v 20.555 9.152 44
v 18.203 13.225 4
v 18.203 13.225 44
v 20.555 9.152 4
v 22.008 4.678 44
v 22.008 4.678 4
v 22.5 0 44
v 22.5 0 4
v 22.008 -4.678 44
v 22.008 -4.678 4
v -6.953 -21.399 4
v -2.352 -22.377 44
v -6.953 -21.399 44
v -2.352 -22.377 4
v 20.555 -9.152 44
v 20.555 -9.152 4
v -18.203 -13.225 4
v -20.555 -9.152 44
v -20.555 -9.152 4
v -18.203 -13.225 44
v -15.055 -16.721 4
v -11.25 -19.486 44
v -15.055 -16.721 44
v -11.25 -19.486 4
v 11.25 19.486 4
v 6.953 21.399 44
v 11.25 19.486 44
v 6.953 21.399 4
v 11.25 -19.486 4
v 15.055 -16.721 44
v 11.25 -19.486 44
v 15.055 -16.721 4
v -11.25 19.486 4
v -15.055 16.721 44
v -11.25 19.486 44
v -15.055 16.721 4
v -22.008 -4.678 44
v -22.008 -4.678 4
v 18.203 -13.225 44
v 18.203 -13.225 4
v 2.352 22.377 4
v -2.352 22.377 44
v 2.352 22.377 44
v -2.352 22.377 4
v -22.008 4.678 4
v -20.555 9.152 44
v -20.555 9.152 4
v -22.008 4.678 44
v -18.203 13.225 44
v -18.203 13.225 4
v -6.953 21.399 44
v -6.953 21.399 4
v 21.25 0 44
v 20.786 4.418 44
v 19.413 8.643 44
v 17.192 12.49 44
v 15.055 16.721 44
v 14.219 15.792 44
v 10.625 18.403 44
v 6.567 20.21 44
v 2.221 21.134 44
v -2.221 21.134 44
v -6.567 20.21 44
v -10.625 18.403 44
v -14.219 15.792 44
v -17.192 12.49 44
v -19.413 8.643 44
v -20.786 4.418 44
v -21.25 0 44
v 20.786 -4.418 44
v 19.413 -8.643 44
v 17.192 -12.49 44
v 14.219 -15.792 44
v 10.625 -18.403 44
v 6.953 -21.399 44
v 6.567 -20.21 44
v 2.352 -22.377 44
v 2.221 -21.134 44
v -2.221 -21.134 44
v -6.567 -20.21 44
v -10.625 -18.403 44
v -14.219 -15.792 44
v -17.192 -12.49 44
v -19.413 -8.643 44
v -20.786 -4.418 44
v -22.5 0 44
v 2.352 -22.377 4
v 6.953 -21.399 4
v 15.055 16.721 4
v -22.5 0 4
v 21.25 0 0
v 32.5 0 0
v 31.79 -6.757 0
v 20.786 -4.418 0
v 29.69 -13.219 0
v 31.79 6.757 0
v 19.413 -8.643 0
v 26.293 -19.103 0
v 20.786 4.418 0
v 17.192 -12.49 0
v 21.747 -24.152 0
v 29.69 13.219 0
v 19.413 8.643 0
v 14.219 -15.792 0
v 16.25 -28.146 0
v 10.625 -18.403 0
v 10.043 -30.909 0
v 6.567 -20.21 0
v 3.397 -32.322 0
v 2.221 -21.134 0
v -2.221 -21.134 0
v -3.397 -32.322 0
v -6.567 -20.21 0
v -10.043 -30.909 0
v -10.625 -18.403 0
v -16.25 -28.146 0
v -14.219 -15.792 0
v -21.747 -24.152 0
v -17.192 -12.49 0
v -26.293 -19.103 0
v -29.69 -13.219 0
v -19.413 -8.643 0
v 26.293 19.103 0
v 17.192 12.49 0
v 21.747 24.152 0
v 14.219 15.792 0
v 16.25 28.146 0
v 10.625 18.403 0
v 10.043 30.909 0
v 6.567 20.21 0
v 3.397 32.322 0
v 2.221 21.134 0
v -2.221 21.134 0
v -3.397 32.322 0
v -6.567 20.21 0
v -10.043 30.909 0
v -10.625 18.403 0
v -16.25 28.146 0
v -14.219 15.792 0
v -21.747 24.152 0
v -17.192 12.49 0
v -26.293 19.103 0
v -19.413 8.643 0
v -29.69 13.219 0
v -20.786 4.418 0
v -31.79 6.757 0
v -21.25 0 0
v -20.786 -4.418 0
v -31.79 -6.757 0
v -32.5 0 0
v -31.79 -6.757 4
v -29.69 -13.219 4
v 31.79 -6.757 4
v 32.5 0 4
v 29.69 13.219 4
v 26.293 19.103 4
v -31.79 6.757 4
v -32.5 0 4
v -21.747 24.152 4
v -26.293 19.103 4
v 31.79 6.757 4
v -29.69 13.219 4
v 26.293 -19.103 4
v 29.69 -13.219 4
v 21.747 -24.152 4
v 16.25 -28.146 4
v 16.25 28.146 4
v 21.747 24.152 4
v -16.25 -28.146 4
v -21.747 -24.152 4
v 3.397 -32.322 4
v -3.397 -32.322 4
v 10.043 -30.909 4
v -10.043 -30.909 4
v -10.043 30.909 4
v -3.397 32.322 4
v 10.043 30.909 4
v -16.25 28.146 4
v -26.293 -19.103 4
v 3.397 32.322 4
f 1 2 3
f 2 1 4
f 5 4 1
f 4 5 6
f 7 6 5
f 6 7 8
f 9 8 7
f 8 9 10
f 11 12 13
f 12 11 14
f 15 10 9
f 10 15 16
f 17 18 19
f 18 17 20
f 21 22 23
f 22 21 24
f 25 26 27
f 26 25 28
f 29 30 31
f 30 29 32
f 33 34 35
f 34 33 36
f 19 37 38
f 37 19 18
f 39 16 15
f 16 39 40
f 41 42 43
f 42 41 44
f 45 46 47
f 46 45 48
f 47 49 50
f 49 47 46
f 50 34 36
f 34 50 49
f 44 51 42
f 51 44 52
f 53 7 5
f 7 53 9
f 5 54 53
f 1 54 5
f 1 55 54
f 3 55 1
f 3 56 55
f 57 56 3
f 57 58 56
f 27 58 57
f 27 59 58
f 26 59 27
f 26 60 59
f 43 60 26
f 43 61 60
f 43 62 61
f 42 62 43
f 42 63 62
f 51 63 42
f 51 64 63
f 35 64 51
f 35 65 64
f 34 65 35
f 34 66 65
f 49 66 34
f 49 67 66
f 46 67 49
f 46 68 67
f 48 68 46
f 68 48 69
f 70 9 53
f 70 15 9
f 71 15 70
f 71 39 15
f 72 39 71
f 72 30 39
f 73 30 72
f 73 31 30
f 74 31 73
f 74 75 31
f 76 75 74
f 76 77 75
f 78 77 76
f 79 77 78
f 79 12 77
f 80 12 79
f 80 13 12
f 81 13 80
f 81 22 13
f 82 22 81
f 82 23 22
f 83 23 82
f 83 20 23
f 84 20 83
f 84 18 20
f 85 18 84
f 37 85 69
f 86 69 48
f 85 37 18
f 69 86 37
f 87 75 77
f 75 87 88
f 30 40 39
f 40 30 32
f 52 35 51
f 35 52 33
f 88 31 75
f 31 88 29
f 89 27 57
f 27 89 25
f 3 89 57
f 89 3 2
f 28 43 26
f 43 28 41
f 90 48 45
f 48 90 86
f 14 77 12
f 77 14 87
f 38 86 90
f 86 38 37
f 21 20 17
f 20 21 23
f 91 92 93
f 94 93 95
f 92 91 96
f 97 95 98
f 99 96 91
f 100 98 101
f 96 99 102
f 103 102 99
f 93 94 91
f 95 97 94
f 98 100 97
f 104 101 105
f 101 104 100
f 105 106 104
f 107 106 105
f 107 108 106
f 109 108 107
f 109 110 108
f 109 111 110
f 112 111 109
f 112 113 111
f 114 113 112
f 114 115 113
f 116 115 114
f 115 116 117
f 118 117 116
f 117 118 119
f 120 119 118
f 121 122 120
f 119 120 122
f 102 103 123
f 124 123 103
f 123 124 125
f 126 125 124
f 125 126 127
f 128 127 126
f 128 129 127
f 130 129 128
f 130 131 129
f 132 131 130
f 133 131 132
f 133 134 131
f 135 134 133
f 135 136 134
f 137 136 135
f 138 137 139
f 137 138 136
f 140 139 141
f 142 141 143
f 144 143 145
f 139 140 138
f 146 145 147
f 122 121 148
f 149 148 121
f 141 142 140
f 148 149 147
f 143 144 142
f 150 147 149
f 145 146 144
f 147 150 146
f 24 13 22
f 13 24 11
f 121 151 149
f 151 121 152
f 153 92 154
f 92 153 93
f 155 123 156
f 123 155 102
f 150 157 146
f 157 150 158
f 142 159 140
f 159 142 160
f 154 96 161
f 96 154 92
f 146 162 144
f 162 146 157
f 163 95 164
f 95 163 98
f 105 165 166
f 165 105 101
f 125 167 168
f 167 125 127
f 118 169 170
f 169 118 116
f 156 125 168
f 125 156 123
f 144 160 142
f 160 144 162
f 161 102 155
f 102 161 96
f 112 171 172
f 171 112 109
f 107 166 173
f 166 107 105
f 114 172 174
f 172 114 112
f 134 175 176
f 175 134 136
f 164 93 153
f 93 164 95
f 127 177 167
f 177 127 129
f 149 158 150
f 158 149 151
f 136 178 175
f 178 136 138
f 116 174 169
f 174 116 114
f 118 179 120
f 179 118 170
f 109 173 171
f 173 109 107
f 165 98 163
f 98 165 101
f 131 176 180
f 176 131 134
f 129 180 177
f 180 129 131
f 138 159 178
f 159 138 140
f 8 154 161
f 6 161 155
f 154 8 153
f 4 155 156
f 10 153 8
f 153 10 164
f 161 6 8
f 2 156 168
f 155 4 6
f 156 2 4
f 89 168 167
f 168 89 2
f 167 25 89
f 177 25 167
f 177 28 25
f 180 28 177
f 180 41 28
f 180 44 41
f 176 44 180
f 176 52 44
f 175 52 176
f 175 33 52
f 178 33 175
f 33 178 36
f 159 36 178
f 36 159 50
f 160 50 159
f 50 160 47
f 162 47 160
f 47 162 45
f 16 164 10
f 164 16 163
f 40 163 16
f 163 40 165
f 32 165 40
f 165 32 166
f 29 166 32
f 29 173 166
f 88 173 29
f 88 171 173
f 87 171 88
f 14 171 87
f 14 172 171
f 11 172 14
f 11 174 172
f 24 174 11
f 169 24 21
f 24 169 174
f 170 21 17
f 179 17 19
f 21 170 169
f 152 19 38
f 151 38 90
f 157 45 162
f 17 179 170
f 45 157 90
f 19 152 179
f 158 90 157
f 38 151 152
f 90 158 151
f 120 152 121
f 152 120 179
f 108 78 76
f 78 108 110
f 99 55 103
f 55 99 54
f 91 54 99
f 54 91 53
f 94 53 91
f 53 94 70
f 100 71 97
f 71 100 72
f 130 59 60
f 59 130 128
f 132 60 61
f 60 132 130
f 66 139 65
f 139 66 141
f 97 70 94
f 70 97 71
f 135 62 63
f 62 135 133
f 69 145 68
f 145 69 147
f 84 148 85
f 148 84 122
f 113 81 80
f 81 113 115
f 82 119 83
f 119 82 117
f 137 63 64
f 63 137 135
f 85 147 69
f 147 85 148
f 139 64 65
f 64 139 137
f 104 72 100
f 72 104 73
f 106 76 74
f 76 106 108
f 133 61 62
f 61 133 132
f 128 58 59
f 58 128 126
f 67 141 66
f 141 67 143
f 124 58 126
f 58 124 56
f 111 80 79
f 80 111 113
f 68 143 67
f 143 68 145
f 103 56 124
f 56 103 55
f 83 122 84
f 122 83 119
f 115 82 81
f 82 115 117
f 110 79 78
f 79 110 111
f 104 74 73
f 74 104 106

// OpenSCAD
// file: parameters/verticalShaftHolderParameters.scad
// https://paper.dropbox.com/doc/Shaft-Holder-with-Bearings--BPUd0R93dqpLMge3XfPWzi2zAg-a79LjXcU3vrNJJHZMteSG

rollerBearingInsideDiameter = 45; // Same as Thrust Bearing bore diameter
rollerBearingHeight = 20;
rollerBearingOutsideDiameter = 52.2;

thrustBearingOutsideDiameter = 65;
thrustBearingHeight = 14;
thrustBearingOuterDiameterShaftWasher = 47;

thrustBearingMinimumAbutmentDiameter = 57; // This is a MINIMUM

comfortablePinningDiameter = 55; // Could maybe be bigger?
comfortablePinnedSectionHeight = 20; // May need testing
// file: parameters/commonParameters.scad
// All measurements in millimeters

// "horizontal" and "vertical" refer to how they are printed on the print bed,
// not how they work on the final assembly.
// ALWAYS print verticle pipes straight up if possible, that is 90 degrees from the bed.
// Attempting to print a slanted pipe will be troublesome and require testing for a proper size.
// However, you can print ANY angle ON the bed.

// 1.25" PVC Pipe:
horizontalPipeInsideDiameter_1_25pvc = 42.9;
verticalPipeInsideDiameter_1_25pvc = 42.5;

// 0.5" PVC Pipe:
horizontalPipeInsideDiameter_0_50pvc = 22.1;
verticalPipeInsideDiameter_0_50pvc = 21.7;

// Parameters
jointLegLength = 50;
jointWallThickness = 3.5;
jointPinningHoleDiameter = 7;
jointPinHoleOffset = 10;

// Walker Foot Parameters
inchesToMmConversionFactor = 25.4;

// Current idea is 11 x 21 inches.
walkerFootHeight = 11 * inchesToMmConversionFactor;
walkerFootLength = 21 * inchesToMmConversionFactor;
// Back of Foot is 4 inches longer to cause foot to hang AND LOOK as desired
// I tried 1 inch and it had basically NO affect on how it hangs.
// I think it looks cool at 4 inches, so I am going to test that.
// I *THINK* that it actually doesn't affect lenght of the walker, because the front
// of one compensates for the back of the other.
walkerFootCenterOffset = 0 * inchesToMmConversionFactor; // Remember to multiply any offset by the conversion factor.
walkerFootFrontLength = (walkerFootLength / 2) - (walkerFootCenterOffset / 2);
walkerFootBackLength = (walkerFootLength / 2) + (walkerFootCenterOffset / 2);

footLowerJointLegLength = 75;

// Angles
// This site is great for visualizing what you want: https://www.blocklayer.com/trig/scaleneeng.aspx
// Use this site to check your math and results: https://www.calculator.net/right-triangle-calculator.html
//echo("=======================================================");
//echo("Walker Foot Parameters");
//echo("walkerFootLength", walkerFootLength, walkerFootFrontLength + walkerFootBackLength);
//echo("=======================================================");
//echo("Front:");
//echo("walkerFootHeight (a)", walkerFootHeight);
//echo("walkerFootFrontLength (b)", walkerFootFrontLength);
//walkerFootFrontTriangleTopLength = sqrt(pow(walkerFootHeight, 2) + pow(walkerFootFrontLength, 2));
//echo("walkerFootFrontTriangleTopLength (c)", walkerFootFrontTriangleTopLength);
//walkerFootFrontJointAngle = asin(walkerFootHeight / walkerFootFrontTriangleTopLength);
//echo("walkerFootFrontJointAngle (α):", walkerFootFrontJointAngle);
//walkerAnkleFrontAngle = asin(walkerFootFrontLength / walkerFootFrontTriangleTopLength);
//echo("walkerAnkleFrontAngle (β)", walkerAnkleFrontAngle);
//echo("-------------------------------------------------------");
//echo("Back");
//echo("walkerFootBackLength (b)", walkerFootBackLength);
//walkerFootBackTriangleTopLength = sqrt(pow(walkerFootHeight, 2) + pow(walkerFootBackLength, 2));
//echo("walkerFootBackTriangleTopLength (c)", walkerFootBackTriangleTopLength);
//walkerFootBackJointAngle = asin(walkerFootHeight / walkerFootBackTriangleTopLength);
//echo("walkerFootBackJointAngle (α):", walkerFootBackJointAngle);
//walkerAnkleBackAngle = asin(walkerFootBackLength / walkerFootBackTriangleTopLength);
//echo("walkerAnkleBackAngle (β)", walkerAnkleBackAngle);
//echo("=======================================================");



// This height is purely based on giving space for nice triangles supports.
// It could be shorter, just be sure to adjust the triangles.
walkerBodyLowerShaftHolderRollerBearingHeightAboveThrustBearing = 50;

// 12v Battery Box
batteryHolderWallThickness = 5;

// Battery Dimensions
// https://www.power-sonic.com/product/ps-1290/
batteryHeight = 94;
batteryWidth = 65.6; // Ben uses 65.6, Web Site says 65
batteryLength = 150.6; // Ben uses 150.6, Web site says 141
batteryBoxDepth = 60; // This is arbitrary. Ben uses 60 for the Dalek

// Colors
JointColor = "CornflowerBlue";
PipeColor = "Pink";

// Resoution
// This is perfect for 3D Printing,
// but you may want to comment it out while working to improve preview
// performance
//$fa = 1;
//$fs = 0.4;
// Although this makes it VERY high rez, which might be better for the slicer? Experimenting with it instead.
// NOTE that using $fn causes FreeCAD and hence .step files exported to Fusion 360 to show round items as a series of faces instead of a single object.
//$fn = 500;
// file: verticalShaftHolder.scad
include <parameters/commonParameters.scad>;
include <parameters/verticalShaftHolderParameters.scad>;

// This piece should be able to slide onto the shaft,
// be pinned in place,
// Have a Thrust Bearing sit on it,
// and then have a part that moves around the shaft sit on it.

module verticalShaftHolder(includePinnedRing = true, thrustBearingSupportHeight = thrustBearingHeight,
rollerBearingHeightAboveThrustBearing = thrustBearingHeight, roundedThrustBearingSupport = true, thrustBearingHeightOverride = thrustBearingHeight) {

    totalPartHeight = (includePinnedRing ? comfortablePinnedSectionHeight : 0) +
        thrustBearingSupportHeight +
        thrustBearingHeightOverride +
        rollerBearingHeightAboveThrustBearing +
        rollerBearingHeight;
    echo(str("Height: ", totalPartHeight));

    difference() {
        union() {
            // This is for the roller bearing to work against,
            // and constitutes the overall height
            cylinder(h = totalPartHeight, d = rollerBearingInsideDiameter);

            if (includePinnedRing) {
                // Pin this part
                cylinder(h = comfortablePinnedSectionHeight, d = comfortablePinningDiameter);
            }

            // This is to support the thrust bearing
            translate([0, 0, includePinnedRing ? comfortablePinnedSectionHeight : 0])
                rotate([180, 0, 0])
                    translate([0, 0, - thrustBearingSupportHeight])
                        if (roundedThrustBearingSupport) {
                            hull() {
                                cylinder(h = thrustBearingSupportHeight - 5, d = thrustBearingOutsideDiameter);
                                translate([0, 0, thrustBearingSupportHeight - 5])
                                    rotate_extrude()
                                        translate([(thrustBearingOutsideDiameter / 2) - 5, 0]) circle(r = 5);
                            }
                        } else {
                                cylinder(h = thrustBearingSupportHeight, d = thrustBearingOutsideDiameter);
                        }
        }
        // Hollow out for the pipe to fit in.
        translate([0, 0, - 1]) // -1 just ensures we clear the bottom and don't leave a 2d "film"
            cylinder(h = totalPartHeight + 10, d = verticalPipeInsideDiameter_1_25pvc);

        if (includePinnedRing) {
            // Make a hole near the end of the leg for pinning
            // The -0.01 ensures that the end of the tube is clear.
            rotate([90, 0, 0])
                translate([0, comfortablePinnedSectionHeight / 2, 0])
                    cylinder(
                    h = 500, d = jointPinningHoleDiameter, center = true);
        }
    }
}

//verticalShaftHolder();

// Use this to view the two shafts together
//include<verticalShaftHolderPivotPoint.scad>;
//translate([0, 0, thrustBearingHeight * 2])
//    verticalShaftHolderPivotPoint();
// main file
include <verticalShaftHolder.scad>;

verticalShaftHolder(includePinnedRing = false, rollerBearingHeightAboveThrustBearing = 6, roundedThrustBearingSupport = false, thrustBearingSupportHeight = 4);
